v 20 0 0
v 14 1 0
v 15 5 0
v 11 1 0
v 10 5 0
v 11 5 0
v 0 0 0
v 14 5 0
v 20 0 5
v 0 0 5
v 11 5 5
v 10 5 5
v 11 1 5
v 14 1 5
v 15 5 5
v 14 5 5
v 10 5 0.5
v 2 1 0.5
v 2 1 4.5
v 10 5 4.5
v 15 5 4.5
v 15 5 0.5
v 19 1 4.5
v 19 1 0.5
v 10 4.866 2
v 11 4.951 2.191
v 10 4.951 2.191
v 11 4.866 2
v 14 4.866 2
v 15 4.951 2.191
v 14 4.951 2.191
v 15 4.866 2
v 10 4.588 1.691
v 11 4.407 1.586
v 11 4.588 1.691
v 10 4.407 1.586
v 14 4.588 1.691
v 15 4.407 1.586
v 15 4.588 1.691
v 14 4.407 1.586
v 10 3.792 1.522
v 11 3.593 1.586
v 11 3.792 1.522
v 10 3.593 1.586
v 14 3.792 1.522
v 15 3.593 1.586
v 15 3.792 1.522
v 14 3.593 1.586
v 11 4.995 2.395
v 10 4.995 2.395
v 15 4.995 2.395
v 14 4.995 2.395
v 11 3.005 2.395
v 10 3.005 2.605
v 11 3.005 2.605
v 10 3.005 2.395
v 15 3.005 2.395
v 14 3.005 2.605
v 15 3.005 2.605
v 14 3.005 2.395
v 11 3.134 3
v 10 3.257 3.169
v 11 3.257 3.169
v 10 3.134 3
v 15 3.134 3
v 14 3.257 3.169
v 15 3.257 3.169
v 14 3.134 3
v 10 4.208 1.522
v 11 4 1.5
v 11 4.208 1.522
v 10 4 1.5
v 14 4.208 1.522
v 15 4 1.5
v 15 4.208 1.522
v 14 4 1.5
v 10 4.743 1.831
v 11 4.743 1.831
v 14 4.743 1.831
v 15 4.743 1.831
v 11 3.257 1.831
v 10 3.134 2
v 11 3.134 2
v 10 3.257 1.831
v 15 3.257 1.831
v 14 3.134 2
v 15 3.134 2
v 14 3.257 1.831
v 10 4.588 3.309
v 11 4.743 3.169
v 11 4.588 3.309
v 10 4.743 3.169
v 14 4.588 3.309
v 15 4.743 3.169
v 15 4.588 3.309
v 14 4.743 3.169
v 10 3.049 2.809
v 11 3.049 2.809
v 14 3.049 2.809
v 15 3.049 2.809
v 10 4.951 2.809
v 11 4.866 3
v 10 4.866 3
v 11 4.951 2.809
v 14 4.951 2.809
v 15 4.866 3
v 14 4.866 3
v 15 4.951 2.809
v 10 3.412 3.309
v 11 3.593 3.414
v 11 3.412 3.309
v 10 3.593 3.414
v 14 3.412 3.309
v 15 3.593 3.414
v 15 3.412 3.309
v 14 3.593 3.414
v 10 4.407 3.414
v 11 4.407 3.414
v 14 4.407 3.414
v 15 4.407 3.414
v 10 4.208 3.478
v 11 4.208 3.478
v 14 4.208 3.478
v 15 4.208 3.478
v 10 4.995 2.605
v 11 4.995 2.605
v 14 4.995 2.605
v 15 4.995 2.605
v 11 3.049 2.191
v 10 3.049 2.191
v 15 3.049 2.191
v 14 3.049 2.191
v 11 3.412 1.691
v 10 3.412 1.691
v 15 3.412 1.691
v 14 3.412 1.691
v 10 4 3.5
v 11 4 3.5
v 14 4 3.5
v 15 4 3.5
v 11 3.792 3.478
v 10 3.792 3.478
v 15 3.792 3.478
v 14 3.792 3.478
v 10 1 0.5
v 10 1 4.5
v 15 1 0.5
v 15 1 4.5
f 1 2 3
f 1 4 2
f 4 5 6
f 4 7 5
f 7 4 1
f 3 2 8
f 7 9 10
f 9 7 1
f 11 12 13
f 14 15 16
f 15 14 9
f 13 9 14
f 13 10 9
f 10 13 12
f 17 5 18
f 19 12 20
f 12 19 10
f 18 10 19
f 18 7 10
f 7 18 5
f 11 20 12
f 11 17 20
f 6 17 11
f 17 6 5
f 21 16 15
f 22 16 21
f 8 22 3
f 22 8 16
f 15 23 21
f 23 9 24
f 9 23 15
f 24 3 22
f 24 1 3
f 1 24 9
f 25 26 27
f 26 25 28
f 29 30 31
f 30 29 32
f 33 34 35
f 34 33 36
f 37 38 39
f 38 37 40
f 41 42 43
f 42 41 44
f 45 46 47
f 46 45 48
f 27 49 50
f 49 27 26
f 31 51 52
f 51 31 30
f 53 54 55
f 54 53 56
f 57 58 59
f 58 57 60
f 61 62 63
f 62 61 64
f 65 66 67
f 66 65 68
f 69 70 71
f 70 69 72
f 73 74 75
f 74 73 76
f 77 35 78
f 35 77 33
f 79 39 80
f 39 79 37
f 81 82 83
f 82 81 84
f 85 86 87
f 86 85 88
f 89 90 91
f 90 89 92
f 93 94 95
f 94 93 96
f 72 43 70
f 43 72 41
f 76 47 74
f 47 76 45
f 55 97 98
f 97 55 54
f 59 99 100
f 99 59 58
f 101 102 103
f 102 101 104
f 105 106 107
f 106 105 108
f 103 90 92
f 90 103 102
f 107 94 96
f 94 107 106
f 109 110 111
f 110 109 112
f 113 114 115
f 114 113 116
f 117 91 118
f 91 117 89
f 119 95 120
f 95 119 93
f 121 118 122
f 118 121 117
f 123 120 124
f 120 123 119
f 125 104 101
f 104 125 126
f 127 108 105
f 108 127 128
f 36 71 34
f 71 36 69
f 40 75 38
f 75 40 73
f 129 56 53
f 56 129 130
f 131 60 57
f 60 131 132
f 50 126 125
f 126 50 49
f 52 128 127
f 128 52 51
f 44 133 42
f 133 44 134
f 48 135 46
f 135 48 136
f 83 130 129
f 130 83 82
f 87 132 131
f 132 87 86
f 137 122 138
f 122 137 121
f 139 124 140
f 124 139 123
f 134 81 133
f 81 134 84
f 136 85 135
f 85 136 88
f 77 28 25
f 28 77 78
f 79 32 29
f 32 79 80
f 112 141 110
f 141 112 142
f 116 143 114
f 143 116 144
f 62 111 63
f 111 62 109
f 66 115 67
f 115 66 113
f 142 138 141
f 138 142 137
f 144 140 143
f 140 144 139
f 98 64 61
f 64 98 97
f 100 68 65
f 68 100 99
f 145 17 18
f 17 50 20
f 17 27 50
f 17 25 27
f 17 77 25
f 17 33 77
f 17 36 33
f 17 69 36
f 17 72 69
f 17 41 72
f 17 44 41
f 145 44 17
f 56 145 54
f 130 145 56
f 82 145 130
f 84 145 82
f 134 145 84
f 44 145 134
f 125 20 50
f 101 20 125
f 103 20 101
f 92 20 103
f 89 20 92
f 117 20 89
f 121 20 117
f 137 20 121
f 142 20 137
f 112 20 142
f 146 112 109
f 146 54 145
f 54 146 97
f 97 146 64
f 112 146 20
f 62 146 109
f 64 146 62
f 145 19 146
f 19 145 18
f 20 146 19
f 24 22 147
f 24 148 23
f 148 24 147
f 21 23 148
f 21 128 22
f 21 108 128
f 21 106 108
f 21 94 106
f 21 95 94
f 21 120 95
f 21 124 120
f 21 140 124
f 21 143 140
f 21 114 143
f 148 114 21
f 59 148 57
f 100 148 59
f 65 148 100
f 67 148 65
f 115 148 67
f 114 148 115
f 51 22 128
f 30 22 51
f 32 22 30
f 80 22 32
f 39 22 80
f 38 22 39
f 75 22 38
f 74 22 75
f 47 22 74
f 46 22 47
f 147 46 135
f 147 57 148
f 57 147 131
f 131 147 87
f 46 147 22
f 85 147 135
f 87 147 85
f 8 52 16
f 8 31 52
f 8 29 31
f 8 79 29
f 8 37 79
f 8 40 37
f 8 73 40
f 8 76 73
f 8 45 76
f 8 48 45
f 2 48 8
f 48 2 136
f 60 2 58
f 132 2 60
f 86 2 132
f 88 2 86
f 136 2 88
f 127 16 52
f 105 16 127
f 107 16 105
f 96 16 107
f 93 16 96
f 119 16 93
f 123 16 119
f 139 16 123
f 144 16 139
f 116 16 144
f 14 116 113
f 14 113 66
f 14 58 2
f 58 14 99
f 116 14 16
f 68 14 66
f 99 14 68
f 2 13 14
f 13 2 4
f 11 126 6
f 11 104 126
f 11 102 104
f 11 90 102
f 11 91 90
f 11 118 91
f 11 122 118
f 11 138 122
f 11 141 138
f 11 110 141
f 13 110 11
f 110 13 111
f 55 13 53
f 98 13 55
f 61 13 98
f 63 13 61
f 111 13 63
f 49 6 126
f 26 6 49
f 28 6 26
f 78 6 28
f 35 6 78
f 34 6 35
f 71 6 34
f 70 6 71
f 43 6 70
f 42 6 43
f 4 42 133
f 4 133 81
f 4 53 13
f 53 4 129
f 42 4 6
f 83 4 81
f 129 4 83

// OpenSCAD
// file: ../lib/utils.scad
///< Utilities

function rand_clr() = rands( 0,1,3 );

///< Length conversions
function in2mm( i ) = ( i * 25.4 ); 
function mm2in( m ) = ( m / 25.4 );

/// This is pulled from stackoverflow
/// https://stackoverflow.com/questions/45826208/openscad-rotating-around-a-particular-point

// rotate as per a, v, but around point pt
module rotate_about_pt(z, y, pt) {
    translate(pt)
        rotate([0, y, z ])
            translate(-pt)
                children();   
}

function adjust_z_offset( v, z ) = [for (i=[0:(len(v)-1)]) v[i]+[0,0,z]] ;

///< For each child, translate child by <p> point in points
module foreach_translate(points ){
	for (p=points){
		translate(p) children();
	}
}
// file: ../lib/math.scad
///< Math scad module


function min( x, y ) = x<=y?x:y;
function max( x, y)  = x>=y?x:y;
function xlty( x, y ) = x<y;
function xgty( x, y ) = x>y;

///< Find the hypotenuse from two sides of a right triangle
function hyp_from_sides( a, b ) = sqrt( pow( a, 2 ) + pow( b, 2 ) );

///< Find equal sides from hypotenuse of a right triangle
function sides_from_hyp(h) = sqrt( pow( h, 2 ) / 2 );

///< Find A from hypotenuse and B
function a_from_hb( h, b ) = sqrt( pow( h, 2 ) - pow( b, 2 ) );

function dist_2d( pt2, pt1 ) = sqrt(pow(( pt2[0]-pt1[0] ),2) + pow(( pt2[1]-pt1[1]),2) );

function mid_pt_2d( pt2, pt1 ) = [( pt1[0]+pt2[0] )/2, ( pt1[1]+pt2[1] )/2, 0 ];

function opposite_side_th( theta, hypotenuse ) = sin( theta )*hypotenuse ;
function adjacent_side_th( theta, hypotenuse ) = cos( theta )*hypotenuse ;

///< Test for math functions

A = 3;
B = 4;
echo("Given A=", A, "and B=", B );
H = hyp_from_sides( A, B );
echo("Hypotenuse=", H );
echo("Calc Correct = ", (H == 5) );

echo("Given H=", H, " which is a hypotenuse with equal sides" );
echo( "the sides=", sides_from_hyp( H ) );

echo("Given H=", H, "B=", 4 );
echo("A=", a_from_hb( H, 4 ) );

echo("Distance from [-1,1] and [3,4] = ", dist_2d( [-1,1],[3,4]) );

echo( "Opposite = ", opposite_side_th( 39.0, 30 ), "Theta = ", 39.0, "Hypotenuse = ", 30 );
echo( "Adjacent = ", adjacent_side_th( 60.0, 10 ), "Theta = ", 60.0, "Hypotenuse = ", 10 );

///< Find the sum of a vector <vect> starting from <s> and continuing to <i>
function sumv( vect, i, s=0 ) = ( i == s ? vect[ i ] : vect[ i ] + sumv( vect, i - 1, s ) );
vec = [ 1, 2, 3, 4 ];
l = len( vec )-1;
echo( "Sum vec = ", sumv( vec, l, 0 ) );

///< Find the average of a vector <vect> starting at <s>
function average( vect, s=0 ) = (len( vect ) == 0 ? 0 : ( sumv( vect, len( vect ) - 1, s )/len(vect) ) );
echo( "Ave vec = ", average( vec ) );
vec2 = [];
echo( "Ave vec2 = ", average( vec2 ) );
// main file
///< Object definition
use <../lib/math.scad>;
use <../lib/utils.scad>;


/*
Module: Name
   Preamble and description

*/

/*
Parameters
*/

// Back foot length
bk_foot_l = 10; // [0:1:100]

// Back foot height
bk_foot_h = 5; // [0:1:100]

// Front foot length
fr_foot_l = 5; // [0:1:100]

// Front foot length
fr_foot_h = 5; // [0:1:100]

// Foot depth
foot_d = 5;

// Joining Width
join_w = 5; // [0:1:100]
// Joining Height
join_h = 5; // [0:1:100]


// Thread Diameter
thread_type = "M2"; // [ M2, M2.5, M3, M3.5, M4, M5, M6 ]

// Through hole height
through_hole_h = 5; // [0:1:20]

// Nut Width
nut_w = 10; // [0:1:100]

// Nut Height
nut_h = 4; // [0:1:100]


// Wall thickness
thickness = 1; // [0:1:100]

bk_foot_pts = [
               [ 0,         0         ],
               [ bk_foot_l, bk_foot_h ],
               [ bk_foot_l, 0         ],               
               ];

fr_foot_pts = [
               [ 0,         fr_foot_h ],
               [ fr_foot_l, 0         ],
               [ 0,         0         ],
               ];

///< Parameters after this are hidden from the customizer
module __Customizer_Limit__(){}

_hardware = [
             [ "M1",   1   ],             
             [ "M1.5", 1.5 ],             
             [ "M2",   2   ],
             [ "M2.5", 2.5 ],
             [ "M3",   3   ],
             [ "M3.5", 3.5 ],
             [ "M4",   4   ],
             [ "M5",   5   ],
             [ "M6",   6   ],
             ];
_through_hole_l = bk_foot_l + join_w + fr_foot_l;
_through_hole_h = through_hole_h - hardware( thread_type )/2;
_nut_d = foot_d - thickness;
// Bezel Width
_bezz_w = join_w-thickness*2; // [0:1:100]

// Bezel Height
_bezz_h = join_h; // [0:1:100]


///< Functions
function hardware( type = "M2" ) =
    _hardware[ search( [type], _hardware, 1, 0 )[0]][1];

///< Modules
module foot( pts, d = foot_d  ){
    linear_extrude( d )
        polygon( points = pts );
}

module joiner( w, h, d=foot_d ){
    linear_extrude( d )
       polygon( points = [[ 0,0 ], [0,h], [w,h], [w,0] ]);
}

module cutaway( w, h, d = 4 ){
    linear_extrude( d )
       polygon( points = [[ 0,0 ], [0,h], [w,h], [w,0] ]);
}

///< Build object
difference(){
    union(){
        foot( bk_foot_pts );
        translate( [bk_foot_l,0,0] )
        joiner( join_w, join_h );
        translate( [bk_foot_l+join_w,0,0] )
           foot( fr_foot_pts );
    }
    rotate([0,90,0])
        translate( [ -foot_d/2, _through_hole_h, 0] )
            #color("pink")cylinder( h = _through_hole_l, d = hardware(thread_type), $fn = 30 );

    // Back Nut

    translate( [ bk_foot_l, thickness, thickness/2 ] )#color("red")cutaway( -1*(nut_w), nut_h, d = _nut_d );

    // Front Nut
    translate( [ (bk_foot_l+join_w), thickness, thickness/2 ] )#cutaway( nut_w, nut_h, d = _nut_d );

    // Bezzel gap
    translate( [bk_foot_l+thickness,thickness, -thickness] )
        #color( "cyan" )cutaway( _bezz_w, _bezz_h, d = foot_d + thickness * 2 );
    
}
